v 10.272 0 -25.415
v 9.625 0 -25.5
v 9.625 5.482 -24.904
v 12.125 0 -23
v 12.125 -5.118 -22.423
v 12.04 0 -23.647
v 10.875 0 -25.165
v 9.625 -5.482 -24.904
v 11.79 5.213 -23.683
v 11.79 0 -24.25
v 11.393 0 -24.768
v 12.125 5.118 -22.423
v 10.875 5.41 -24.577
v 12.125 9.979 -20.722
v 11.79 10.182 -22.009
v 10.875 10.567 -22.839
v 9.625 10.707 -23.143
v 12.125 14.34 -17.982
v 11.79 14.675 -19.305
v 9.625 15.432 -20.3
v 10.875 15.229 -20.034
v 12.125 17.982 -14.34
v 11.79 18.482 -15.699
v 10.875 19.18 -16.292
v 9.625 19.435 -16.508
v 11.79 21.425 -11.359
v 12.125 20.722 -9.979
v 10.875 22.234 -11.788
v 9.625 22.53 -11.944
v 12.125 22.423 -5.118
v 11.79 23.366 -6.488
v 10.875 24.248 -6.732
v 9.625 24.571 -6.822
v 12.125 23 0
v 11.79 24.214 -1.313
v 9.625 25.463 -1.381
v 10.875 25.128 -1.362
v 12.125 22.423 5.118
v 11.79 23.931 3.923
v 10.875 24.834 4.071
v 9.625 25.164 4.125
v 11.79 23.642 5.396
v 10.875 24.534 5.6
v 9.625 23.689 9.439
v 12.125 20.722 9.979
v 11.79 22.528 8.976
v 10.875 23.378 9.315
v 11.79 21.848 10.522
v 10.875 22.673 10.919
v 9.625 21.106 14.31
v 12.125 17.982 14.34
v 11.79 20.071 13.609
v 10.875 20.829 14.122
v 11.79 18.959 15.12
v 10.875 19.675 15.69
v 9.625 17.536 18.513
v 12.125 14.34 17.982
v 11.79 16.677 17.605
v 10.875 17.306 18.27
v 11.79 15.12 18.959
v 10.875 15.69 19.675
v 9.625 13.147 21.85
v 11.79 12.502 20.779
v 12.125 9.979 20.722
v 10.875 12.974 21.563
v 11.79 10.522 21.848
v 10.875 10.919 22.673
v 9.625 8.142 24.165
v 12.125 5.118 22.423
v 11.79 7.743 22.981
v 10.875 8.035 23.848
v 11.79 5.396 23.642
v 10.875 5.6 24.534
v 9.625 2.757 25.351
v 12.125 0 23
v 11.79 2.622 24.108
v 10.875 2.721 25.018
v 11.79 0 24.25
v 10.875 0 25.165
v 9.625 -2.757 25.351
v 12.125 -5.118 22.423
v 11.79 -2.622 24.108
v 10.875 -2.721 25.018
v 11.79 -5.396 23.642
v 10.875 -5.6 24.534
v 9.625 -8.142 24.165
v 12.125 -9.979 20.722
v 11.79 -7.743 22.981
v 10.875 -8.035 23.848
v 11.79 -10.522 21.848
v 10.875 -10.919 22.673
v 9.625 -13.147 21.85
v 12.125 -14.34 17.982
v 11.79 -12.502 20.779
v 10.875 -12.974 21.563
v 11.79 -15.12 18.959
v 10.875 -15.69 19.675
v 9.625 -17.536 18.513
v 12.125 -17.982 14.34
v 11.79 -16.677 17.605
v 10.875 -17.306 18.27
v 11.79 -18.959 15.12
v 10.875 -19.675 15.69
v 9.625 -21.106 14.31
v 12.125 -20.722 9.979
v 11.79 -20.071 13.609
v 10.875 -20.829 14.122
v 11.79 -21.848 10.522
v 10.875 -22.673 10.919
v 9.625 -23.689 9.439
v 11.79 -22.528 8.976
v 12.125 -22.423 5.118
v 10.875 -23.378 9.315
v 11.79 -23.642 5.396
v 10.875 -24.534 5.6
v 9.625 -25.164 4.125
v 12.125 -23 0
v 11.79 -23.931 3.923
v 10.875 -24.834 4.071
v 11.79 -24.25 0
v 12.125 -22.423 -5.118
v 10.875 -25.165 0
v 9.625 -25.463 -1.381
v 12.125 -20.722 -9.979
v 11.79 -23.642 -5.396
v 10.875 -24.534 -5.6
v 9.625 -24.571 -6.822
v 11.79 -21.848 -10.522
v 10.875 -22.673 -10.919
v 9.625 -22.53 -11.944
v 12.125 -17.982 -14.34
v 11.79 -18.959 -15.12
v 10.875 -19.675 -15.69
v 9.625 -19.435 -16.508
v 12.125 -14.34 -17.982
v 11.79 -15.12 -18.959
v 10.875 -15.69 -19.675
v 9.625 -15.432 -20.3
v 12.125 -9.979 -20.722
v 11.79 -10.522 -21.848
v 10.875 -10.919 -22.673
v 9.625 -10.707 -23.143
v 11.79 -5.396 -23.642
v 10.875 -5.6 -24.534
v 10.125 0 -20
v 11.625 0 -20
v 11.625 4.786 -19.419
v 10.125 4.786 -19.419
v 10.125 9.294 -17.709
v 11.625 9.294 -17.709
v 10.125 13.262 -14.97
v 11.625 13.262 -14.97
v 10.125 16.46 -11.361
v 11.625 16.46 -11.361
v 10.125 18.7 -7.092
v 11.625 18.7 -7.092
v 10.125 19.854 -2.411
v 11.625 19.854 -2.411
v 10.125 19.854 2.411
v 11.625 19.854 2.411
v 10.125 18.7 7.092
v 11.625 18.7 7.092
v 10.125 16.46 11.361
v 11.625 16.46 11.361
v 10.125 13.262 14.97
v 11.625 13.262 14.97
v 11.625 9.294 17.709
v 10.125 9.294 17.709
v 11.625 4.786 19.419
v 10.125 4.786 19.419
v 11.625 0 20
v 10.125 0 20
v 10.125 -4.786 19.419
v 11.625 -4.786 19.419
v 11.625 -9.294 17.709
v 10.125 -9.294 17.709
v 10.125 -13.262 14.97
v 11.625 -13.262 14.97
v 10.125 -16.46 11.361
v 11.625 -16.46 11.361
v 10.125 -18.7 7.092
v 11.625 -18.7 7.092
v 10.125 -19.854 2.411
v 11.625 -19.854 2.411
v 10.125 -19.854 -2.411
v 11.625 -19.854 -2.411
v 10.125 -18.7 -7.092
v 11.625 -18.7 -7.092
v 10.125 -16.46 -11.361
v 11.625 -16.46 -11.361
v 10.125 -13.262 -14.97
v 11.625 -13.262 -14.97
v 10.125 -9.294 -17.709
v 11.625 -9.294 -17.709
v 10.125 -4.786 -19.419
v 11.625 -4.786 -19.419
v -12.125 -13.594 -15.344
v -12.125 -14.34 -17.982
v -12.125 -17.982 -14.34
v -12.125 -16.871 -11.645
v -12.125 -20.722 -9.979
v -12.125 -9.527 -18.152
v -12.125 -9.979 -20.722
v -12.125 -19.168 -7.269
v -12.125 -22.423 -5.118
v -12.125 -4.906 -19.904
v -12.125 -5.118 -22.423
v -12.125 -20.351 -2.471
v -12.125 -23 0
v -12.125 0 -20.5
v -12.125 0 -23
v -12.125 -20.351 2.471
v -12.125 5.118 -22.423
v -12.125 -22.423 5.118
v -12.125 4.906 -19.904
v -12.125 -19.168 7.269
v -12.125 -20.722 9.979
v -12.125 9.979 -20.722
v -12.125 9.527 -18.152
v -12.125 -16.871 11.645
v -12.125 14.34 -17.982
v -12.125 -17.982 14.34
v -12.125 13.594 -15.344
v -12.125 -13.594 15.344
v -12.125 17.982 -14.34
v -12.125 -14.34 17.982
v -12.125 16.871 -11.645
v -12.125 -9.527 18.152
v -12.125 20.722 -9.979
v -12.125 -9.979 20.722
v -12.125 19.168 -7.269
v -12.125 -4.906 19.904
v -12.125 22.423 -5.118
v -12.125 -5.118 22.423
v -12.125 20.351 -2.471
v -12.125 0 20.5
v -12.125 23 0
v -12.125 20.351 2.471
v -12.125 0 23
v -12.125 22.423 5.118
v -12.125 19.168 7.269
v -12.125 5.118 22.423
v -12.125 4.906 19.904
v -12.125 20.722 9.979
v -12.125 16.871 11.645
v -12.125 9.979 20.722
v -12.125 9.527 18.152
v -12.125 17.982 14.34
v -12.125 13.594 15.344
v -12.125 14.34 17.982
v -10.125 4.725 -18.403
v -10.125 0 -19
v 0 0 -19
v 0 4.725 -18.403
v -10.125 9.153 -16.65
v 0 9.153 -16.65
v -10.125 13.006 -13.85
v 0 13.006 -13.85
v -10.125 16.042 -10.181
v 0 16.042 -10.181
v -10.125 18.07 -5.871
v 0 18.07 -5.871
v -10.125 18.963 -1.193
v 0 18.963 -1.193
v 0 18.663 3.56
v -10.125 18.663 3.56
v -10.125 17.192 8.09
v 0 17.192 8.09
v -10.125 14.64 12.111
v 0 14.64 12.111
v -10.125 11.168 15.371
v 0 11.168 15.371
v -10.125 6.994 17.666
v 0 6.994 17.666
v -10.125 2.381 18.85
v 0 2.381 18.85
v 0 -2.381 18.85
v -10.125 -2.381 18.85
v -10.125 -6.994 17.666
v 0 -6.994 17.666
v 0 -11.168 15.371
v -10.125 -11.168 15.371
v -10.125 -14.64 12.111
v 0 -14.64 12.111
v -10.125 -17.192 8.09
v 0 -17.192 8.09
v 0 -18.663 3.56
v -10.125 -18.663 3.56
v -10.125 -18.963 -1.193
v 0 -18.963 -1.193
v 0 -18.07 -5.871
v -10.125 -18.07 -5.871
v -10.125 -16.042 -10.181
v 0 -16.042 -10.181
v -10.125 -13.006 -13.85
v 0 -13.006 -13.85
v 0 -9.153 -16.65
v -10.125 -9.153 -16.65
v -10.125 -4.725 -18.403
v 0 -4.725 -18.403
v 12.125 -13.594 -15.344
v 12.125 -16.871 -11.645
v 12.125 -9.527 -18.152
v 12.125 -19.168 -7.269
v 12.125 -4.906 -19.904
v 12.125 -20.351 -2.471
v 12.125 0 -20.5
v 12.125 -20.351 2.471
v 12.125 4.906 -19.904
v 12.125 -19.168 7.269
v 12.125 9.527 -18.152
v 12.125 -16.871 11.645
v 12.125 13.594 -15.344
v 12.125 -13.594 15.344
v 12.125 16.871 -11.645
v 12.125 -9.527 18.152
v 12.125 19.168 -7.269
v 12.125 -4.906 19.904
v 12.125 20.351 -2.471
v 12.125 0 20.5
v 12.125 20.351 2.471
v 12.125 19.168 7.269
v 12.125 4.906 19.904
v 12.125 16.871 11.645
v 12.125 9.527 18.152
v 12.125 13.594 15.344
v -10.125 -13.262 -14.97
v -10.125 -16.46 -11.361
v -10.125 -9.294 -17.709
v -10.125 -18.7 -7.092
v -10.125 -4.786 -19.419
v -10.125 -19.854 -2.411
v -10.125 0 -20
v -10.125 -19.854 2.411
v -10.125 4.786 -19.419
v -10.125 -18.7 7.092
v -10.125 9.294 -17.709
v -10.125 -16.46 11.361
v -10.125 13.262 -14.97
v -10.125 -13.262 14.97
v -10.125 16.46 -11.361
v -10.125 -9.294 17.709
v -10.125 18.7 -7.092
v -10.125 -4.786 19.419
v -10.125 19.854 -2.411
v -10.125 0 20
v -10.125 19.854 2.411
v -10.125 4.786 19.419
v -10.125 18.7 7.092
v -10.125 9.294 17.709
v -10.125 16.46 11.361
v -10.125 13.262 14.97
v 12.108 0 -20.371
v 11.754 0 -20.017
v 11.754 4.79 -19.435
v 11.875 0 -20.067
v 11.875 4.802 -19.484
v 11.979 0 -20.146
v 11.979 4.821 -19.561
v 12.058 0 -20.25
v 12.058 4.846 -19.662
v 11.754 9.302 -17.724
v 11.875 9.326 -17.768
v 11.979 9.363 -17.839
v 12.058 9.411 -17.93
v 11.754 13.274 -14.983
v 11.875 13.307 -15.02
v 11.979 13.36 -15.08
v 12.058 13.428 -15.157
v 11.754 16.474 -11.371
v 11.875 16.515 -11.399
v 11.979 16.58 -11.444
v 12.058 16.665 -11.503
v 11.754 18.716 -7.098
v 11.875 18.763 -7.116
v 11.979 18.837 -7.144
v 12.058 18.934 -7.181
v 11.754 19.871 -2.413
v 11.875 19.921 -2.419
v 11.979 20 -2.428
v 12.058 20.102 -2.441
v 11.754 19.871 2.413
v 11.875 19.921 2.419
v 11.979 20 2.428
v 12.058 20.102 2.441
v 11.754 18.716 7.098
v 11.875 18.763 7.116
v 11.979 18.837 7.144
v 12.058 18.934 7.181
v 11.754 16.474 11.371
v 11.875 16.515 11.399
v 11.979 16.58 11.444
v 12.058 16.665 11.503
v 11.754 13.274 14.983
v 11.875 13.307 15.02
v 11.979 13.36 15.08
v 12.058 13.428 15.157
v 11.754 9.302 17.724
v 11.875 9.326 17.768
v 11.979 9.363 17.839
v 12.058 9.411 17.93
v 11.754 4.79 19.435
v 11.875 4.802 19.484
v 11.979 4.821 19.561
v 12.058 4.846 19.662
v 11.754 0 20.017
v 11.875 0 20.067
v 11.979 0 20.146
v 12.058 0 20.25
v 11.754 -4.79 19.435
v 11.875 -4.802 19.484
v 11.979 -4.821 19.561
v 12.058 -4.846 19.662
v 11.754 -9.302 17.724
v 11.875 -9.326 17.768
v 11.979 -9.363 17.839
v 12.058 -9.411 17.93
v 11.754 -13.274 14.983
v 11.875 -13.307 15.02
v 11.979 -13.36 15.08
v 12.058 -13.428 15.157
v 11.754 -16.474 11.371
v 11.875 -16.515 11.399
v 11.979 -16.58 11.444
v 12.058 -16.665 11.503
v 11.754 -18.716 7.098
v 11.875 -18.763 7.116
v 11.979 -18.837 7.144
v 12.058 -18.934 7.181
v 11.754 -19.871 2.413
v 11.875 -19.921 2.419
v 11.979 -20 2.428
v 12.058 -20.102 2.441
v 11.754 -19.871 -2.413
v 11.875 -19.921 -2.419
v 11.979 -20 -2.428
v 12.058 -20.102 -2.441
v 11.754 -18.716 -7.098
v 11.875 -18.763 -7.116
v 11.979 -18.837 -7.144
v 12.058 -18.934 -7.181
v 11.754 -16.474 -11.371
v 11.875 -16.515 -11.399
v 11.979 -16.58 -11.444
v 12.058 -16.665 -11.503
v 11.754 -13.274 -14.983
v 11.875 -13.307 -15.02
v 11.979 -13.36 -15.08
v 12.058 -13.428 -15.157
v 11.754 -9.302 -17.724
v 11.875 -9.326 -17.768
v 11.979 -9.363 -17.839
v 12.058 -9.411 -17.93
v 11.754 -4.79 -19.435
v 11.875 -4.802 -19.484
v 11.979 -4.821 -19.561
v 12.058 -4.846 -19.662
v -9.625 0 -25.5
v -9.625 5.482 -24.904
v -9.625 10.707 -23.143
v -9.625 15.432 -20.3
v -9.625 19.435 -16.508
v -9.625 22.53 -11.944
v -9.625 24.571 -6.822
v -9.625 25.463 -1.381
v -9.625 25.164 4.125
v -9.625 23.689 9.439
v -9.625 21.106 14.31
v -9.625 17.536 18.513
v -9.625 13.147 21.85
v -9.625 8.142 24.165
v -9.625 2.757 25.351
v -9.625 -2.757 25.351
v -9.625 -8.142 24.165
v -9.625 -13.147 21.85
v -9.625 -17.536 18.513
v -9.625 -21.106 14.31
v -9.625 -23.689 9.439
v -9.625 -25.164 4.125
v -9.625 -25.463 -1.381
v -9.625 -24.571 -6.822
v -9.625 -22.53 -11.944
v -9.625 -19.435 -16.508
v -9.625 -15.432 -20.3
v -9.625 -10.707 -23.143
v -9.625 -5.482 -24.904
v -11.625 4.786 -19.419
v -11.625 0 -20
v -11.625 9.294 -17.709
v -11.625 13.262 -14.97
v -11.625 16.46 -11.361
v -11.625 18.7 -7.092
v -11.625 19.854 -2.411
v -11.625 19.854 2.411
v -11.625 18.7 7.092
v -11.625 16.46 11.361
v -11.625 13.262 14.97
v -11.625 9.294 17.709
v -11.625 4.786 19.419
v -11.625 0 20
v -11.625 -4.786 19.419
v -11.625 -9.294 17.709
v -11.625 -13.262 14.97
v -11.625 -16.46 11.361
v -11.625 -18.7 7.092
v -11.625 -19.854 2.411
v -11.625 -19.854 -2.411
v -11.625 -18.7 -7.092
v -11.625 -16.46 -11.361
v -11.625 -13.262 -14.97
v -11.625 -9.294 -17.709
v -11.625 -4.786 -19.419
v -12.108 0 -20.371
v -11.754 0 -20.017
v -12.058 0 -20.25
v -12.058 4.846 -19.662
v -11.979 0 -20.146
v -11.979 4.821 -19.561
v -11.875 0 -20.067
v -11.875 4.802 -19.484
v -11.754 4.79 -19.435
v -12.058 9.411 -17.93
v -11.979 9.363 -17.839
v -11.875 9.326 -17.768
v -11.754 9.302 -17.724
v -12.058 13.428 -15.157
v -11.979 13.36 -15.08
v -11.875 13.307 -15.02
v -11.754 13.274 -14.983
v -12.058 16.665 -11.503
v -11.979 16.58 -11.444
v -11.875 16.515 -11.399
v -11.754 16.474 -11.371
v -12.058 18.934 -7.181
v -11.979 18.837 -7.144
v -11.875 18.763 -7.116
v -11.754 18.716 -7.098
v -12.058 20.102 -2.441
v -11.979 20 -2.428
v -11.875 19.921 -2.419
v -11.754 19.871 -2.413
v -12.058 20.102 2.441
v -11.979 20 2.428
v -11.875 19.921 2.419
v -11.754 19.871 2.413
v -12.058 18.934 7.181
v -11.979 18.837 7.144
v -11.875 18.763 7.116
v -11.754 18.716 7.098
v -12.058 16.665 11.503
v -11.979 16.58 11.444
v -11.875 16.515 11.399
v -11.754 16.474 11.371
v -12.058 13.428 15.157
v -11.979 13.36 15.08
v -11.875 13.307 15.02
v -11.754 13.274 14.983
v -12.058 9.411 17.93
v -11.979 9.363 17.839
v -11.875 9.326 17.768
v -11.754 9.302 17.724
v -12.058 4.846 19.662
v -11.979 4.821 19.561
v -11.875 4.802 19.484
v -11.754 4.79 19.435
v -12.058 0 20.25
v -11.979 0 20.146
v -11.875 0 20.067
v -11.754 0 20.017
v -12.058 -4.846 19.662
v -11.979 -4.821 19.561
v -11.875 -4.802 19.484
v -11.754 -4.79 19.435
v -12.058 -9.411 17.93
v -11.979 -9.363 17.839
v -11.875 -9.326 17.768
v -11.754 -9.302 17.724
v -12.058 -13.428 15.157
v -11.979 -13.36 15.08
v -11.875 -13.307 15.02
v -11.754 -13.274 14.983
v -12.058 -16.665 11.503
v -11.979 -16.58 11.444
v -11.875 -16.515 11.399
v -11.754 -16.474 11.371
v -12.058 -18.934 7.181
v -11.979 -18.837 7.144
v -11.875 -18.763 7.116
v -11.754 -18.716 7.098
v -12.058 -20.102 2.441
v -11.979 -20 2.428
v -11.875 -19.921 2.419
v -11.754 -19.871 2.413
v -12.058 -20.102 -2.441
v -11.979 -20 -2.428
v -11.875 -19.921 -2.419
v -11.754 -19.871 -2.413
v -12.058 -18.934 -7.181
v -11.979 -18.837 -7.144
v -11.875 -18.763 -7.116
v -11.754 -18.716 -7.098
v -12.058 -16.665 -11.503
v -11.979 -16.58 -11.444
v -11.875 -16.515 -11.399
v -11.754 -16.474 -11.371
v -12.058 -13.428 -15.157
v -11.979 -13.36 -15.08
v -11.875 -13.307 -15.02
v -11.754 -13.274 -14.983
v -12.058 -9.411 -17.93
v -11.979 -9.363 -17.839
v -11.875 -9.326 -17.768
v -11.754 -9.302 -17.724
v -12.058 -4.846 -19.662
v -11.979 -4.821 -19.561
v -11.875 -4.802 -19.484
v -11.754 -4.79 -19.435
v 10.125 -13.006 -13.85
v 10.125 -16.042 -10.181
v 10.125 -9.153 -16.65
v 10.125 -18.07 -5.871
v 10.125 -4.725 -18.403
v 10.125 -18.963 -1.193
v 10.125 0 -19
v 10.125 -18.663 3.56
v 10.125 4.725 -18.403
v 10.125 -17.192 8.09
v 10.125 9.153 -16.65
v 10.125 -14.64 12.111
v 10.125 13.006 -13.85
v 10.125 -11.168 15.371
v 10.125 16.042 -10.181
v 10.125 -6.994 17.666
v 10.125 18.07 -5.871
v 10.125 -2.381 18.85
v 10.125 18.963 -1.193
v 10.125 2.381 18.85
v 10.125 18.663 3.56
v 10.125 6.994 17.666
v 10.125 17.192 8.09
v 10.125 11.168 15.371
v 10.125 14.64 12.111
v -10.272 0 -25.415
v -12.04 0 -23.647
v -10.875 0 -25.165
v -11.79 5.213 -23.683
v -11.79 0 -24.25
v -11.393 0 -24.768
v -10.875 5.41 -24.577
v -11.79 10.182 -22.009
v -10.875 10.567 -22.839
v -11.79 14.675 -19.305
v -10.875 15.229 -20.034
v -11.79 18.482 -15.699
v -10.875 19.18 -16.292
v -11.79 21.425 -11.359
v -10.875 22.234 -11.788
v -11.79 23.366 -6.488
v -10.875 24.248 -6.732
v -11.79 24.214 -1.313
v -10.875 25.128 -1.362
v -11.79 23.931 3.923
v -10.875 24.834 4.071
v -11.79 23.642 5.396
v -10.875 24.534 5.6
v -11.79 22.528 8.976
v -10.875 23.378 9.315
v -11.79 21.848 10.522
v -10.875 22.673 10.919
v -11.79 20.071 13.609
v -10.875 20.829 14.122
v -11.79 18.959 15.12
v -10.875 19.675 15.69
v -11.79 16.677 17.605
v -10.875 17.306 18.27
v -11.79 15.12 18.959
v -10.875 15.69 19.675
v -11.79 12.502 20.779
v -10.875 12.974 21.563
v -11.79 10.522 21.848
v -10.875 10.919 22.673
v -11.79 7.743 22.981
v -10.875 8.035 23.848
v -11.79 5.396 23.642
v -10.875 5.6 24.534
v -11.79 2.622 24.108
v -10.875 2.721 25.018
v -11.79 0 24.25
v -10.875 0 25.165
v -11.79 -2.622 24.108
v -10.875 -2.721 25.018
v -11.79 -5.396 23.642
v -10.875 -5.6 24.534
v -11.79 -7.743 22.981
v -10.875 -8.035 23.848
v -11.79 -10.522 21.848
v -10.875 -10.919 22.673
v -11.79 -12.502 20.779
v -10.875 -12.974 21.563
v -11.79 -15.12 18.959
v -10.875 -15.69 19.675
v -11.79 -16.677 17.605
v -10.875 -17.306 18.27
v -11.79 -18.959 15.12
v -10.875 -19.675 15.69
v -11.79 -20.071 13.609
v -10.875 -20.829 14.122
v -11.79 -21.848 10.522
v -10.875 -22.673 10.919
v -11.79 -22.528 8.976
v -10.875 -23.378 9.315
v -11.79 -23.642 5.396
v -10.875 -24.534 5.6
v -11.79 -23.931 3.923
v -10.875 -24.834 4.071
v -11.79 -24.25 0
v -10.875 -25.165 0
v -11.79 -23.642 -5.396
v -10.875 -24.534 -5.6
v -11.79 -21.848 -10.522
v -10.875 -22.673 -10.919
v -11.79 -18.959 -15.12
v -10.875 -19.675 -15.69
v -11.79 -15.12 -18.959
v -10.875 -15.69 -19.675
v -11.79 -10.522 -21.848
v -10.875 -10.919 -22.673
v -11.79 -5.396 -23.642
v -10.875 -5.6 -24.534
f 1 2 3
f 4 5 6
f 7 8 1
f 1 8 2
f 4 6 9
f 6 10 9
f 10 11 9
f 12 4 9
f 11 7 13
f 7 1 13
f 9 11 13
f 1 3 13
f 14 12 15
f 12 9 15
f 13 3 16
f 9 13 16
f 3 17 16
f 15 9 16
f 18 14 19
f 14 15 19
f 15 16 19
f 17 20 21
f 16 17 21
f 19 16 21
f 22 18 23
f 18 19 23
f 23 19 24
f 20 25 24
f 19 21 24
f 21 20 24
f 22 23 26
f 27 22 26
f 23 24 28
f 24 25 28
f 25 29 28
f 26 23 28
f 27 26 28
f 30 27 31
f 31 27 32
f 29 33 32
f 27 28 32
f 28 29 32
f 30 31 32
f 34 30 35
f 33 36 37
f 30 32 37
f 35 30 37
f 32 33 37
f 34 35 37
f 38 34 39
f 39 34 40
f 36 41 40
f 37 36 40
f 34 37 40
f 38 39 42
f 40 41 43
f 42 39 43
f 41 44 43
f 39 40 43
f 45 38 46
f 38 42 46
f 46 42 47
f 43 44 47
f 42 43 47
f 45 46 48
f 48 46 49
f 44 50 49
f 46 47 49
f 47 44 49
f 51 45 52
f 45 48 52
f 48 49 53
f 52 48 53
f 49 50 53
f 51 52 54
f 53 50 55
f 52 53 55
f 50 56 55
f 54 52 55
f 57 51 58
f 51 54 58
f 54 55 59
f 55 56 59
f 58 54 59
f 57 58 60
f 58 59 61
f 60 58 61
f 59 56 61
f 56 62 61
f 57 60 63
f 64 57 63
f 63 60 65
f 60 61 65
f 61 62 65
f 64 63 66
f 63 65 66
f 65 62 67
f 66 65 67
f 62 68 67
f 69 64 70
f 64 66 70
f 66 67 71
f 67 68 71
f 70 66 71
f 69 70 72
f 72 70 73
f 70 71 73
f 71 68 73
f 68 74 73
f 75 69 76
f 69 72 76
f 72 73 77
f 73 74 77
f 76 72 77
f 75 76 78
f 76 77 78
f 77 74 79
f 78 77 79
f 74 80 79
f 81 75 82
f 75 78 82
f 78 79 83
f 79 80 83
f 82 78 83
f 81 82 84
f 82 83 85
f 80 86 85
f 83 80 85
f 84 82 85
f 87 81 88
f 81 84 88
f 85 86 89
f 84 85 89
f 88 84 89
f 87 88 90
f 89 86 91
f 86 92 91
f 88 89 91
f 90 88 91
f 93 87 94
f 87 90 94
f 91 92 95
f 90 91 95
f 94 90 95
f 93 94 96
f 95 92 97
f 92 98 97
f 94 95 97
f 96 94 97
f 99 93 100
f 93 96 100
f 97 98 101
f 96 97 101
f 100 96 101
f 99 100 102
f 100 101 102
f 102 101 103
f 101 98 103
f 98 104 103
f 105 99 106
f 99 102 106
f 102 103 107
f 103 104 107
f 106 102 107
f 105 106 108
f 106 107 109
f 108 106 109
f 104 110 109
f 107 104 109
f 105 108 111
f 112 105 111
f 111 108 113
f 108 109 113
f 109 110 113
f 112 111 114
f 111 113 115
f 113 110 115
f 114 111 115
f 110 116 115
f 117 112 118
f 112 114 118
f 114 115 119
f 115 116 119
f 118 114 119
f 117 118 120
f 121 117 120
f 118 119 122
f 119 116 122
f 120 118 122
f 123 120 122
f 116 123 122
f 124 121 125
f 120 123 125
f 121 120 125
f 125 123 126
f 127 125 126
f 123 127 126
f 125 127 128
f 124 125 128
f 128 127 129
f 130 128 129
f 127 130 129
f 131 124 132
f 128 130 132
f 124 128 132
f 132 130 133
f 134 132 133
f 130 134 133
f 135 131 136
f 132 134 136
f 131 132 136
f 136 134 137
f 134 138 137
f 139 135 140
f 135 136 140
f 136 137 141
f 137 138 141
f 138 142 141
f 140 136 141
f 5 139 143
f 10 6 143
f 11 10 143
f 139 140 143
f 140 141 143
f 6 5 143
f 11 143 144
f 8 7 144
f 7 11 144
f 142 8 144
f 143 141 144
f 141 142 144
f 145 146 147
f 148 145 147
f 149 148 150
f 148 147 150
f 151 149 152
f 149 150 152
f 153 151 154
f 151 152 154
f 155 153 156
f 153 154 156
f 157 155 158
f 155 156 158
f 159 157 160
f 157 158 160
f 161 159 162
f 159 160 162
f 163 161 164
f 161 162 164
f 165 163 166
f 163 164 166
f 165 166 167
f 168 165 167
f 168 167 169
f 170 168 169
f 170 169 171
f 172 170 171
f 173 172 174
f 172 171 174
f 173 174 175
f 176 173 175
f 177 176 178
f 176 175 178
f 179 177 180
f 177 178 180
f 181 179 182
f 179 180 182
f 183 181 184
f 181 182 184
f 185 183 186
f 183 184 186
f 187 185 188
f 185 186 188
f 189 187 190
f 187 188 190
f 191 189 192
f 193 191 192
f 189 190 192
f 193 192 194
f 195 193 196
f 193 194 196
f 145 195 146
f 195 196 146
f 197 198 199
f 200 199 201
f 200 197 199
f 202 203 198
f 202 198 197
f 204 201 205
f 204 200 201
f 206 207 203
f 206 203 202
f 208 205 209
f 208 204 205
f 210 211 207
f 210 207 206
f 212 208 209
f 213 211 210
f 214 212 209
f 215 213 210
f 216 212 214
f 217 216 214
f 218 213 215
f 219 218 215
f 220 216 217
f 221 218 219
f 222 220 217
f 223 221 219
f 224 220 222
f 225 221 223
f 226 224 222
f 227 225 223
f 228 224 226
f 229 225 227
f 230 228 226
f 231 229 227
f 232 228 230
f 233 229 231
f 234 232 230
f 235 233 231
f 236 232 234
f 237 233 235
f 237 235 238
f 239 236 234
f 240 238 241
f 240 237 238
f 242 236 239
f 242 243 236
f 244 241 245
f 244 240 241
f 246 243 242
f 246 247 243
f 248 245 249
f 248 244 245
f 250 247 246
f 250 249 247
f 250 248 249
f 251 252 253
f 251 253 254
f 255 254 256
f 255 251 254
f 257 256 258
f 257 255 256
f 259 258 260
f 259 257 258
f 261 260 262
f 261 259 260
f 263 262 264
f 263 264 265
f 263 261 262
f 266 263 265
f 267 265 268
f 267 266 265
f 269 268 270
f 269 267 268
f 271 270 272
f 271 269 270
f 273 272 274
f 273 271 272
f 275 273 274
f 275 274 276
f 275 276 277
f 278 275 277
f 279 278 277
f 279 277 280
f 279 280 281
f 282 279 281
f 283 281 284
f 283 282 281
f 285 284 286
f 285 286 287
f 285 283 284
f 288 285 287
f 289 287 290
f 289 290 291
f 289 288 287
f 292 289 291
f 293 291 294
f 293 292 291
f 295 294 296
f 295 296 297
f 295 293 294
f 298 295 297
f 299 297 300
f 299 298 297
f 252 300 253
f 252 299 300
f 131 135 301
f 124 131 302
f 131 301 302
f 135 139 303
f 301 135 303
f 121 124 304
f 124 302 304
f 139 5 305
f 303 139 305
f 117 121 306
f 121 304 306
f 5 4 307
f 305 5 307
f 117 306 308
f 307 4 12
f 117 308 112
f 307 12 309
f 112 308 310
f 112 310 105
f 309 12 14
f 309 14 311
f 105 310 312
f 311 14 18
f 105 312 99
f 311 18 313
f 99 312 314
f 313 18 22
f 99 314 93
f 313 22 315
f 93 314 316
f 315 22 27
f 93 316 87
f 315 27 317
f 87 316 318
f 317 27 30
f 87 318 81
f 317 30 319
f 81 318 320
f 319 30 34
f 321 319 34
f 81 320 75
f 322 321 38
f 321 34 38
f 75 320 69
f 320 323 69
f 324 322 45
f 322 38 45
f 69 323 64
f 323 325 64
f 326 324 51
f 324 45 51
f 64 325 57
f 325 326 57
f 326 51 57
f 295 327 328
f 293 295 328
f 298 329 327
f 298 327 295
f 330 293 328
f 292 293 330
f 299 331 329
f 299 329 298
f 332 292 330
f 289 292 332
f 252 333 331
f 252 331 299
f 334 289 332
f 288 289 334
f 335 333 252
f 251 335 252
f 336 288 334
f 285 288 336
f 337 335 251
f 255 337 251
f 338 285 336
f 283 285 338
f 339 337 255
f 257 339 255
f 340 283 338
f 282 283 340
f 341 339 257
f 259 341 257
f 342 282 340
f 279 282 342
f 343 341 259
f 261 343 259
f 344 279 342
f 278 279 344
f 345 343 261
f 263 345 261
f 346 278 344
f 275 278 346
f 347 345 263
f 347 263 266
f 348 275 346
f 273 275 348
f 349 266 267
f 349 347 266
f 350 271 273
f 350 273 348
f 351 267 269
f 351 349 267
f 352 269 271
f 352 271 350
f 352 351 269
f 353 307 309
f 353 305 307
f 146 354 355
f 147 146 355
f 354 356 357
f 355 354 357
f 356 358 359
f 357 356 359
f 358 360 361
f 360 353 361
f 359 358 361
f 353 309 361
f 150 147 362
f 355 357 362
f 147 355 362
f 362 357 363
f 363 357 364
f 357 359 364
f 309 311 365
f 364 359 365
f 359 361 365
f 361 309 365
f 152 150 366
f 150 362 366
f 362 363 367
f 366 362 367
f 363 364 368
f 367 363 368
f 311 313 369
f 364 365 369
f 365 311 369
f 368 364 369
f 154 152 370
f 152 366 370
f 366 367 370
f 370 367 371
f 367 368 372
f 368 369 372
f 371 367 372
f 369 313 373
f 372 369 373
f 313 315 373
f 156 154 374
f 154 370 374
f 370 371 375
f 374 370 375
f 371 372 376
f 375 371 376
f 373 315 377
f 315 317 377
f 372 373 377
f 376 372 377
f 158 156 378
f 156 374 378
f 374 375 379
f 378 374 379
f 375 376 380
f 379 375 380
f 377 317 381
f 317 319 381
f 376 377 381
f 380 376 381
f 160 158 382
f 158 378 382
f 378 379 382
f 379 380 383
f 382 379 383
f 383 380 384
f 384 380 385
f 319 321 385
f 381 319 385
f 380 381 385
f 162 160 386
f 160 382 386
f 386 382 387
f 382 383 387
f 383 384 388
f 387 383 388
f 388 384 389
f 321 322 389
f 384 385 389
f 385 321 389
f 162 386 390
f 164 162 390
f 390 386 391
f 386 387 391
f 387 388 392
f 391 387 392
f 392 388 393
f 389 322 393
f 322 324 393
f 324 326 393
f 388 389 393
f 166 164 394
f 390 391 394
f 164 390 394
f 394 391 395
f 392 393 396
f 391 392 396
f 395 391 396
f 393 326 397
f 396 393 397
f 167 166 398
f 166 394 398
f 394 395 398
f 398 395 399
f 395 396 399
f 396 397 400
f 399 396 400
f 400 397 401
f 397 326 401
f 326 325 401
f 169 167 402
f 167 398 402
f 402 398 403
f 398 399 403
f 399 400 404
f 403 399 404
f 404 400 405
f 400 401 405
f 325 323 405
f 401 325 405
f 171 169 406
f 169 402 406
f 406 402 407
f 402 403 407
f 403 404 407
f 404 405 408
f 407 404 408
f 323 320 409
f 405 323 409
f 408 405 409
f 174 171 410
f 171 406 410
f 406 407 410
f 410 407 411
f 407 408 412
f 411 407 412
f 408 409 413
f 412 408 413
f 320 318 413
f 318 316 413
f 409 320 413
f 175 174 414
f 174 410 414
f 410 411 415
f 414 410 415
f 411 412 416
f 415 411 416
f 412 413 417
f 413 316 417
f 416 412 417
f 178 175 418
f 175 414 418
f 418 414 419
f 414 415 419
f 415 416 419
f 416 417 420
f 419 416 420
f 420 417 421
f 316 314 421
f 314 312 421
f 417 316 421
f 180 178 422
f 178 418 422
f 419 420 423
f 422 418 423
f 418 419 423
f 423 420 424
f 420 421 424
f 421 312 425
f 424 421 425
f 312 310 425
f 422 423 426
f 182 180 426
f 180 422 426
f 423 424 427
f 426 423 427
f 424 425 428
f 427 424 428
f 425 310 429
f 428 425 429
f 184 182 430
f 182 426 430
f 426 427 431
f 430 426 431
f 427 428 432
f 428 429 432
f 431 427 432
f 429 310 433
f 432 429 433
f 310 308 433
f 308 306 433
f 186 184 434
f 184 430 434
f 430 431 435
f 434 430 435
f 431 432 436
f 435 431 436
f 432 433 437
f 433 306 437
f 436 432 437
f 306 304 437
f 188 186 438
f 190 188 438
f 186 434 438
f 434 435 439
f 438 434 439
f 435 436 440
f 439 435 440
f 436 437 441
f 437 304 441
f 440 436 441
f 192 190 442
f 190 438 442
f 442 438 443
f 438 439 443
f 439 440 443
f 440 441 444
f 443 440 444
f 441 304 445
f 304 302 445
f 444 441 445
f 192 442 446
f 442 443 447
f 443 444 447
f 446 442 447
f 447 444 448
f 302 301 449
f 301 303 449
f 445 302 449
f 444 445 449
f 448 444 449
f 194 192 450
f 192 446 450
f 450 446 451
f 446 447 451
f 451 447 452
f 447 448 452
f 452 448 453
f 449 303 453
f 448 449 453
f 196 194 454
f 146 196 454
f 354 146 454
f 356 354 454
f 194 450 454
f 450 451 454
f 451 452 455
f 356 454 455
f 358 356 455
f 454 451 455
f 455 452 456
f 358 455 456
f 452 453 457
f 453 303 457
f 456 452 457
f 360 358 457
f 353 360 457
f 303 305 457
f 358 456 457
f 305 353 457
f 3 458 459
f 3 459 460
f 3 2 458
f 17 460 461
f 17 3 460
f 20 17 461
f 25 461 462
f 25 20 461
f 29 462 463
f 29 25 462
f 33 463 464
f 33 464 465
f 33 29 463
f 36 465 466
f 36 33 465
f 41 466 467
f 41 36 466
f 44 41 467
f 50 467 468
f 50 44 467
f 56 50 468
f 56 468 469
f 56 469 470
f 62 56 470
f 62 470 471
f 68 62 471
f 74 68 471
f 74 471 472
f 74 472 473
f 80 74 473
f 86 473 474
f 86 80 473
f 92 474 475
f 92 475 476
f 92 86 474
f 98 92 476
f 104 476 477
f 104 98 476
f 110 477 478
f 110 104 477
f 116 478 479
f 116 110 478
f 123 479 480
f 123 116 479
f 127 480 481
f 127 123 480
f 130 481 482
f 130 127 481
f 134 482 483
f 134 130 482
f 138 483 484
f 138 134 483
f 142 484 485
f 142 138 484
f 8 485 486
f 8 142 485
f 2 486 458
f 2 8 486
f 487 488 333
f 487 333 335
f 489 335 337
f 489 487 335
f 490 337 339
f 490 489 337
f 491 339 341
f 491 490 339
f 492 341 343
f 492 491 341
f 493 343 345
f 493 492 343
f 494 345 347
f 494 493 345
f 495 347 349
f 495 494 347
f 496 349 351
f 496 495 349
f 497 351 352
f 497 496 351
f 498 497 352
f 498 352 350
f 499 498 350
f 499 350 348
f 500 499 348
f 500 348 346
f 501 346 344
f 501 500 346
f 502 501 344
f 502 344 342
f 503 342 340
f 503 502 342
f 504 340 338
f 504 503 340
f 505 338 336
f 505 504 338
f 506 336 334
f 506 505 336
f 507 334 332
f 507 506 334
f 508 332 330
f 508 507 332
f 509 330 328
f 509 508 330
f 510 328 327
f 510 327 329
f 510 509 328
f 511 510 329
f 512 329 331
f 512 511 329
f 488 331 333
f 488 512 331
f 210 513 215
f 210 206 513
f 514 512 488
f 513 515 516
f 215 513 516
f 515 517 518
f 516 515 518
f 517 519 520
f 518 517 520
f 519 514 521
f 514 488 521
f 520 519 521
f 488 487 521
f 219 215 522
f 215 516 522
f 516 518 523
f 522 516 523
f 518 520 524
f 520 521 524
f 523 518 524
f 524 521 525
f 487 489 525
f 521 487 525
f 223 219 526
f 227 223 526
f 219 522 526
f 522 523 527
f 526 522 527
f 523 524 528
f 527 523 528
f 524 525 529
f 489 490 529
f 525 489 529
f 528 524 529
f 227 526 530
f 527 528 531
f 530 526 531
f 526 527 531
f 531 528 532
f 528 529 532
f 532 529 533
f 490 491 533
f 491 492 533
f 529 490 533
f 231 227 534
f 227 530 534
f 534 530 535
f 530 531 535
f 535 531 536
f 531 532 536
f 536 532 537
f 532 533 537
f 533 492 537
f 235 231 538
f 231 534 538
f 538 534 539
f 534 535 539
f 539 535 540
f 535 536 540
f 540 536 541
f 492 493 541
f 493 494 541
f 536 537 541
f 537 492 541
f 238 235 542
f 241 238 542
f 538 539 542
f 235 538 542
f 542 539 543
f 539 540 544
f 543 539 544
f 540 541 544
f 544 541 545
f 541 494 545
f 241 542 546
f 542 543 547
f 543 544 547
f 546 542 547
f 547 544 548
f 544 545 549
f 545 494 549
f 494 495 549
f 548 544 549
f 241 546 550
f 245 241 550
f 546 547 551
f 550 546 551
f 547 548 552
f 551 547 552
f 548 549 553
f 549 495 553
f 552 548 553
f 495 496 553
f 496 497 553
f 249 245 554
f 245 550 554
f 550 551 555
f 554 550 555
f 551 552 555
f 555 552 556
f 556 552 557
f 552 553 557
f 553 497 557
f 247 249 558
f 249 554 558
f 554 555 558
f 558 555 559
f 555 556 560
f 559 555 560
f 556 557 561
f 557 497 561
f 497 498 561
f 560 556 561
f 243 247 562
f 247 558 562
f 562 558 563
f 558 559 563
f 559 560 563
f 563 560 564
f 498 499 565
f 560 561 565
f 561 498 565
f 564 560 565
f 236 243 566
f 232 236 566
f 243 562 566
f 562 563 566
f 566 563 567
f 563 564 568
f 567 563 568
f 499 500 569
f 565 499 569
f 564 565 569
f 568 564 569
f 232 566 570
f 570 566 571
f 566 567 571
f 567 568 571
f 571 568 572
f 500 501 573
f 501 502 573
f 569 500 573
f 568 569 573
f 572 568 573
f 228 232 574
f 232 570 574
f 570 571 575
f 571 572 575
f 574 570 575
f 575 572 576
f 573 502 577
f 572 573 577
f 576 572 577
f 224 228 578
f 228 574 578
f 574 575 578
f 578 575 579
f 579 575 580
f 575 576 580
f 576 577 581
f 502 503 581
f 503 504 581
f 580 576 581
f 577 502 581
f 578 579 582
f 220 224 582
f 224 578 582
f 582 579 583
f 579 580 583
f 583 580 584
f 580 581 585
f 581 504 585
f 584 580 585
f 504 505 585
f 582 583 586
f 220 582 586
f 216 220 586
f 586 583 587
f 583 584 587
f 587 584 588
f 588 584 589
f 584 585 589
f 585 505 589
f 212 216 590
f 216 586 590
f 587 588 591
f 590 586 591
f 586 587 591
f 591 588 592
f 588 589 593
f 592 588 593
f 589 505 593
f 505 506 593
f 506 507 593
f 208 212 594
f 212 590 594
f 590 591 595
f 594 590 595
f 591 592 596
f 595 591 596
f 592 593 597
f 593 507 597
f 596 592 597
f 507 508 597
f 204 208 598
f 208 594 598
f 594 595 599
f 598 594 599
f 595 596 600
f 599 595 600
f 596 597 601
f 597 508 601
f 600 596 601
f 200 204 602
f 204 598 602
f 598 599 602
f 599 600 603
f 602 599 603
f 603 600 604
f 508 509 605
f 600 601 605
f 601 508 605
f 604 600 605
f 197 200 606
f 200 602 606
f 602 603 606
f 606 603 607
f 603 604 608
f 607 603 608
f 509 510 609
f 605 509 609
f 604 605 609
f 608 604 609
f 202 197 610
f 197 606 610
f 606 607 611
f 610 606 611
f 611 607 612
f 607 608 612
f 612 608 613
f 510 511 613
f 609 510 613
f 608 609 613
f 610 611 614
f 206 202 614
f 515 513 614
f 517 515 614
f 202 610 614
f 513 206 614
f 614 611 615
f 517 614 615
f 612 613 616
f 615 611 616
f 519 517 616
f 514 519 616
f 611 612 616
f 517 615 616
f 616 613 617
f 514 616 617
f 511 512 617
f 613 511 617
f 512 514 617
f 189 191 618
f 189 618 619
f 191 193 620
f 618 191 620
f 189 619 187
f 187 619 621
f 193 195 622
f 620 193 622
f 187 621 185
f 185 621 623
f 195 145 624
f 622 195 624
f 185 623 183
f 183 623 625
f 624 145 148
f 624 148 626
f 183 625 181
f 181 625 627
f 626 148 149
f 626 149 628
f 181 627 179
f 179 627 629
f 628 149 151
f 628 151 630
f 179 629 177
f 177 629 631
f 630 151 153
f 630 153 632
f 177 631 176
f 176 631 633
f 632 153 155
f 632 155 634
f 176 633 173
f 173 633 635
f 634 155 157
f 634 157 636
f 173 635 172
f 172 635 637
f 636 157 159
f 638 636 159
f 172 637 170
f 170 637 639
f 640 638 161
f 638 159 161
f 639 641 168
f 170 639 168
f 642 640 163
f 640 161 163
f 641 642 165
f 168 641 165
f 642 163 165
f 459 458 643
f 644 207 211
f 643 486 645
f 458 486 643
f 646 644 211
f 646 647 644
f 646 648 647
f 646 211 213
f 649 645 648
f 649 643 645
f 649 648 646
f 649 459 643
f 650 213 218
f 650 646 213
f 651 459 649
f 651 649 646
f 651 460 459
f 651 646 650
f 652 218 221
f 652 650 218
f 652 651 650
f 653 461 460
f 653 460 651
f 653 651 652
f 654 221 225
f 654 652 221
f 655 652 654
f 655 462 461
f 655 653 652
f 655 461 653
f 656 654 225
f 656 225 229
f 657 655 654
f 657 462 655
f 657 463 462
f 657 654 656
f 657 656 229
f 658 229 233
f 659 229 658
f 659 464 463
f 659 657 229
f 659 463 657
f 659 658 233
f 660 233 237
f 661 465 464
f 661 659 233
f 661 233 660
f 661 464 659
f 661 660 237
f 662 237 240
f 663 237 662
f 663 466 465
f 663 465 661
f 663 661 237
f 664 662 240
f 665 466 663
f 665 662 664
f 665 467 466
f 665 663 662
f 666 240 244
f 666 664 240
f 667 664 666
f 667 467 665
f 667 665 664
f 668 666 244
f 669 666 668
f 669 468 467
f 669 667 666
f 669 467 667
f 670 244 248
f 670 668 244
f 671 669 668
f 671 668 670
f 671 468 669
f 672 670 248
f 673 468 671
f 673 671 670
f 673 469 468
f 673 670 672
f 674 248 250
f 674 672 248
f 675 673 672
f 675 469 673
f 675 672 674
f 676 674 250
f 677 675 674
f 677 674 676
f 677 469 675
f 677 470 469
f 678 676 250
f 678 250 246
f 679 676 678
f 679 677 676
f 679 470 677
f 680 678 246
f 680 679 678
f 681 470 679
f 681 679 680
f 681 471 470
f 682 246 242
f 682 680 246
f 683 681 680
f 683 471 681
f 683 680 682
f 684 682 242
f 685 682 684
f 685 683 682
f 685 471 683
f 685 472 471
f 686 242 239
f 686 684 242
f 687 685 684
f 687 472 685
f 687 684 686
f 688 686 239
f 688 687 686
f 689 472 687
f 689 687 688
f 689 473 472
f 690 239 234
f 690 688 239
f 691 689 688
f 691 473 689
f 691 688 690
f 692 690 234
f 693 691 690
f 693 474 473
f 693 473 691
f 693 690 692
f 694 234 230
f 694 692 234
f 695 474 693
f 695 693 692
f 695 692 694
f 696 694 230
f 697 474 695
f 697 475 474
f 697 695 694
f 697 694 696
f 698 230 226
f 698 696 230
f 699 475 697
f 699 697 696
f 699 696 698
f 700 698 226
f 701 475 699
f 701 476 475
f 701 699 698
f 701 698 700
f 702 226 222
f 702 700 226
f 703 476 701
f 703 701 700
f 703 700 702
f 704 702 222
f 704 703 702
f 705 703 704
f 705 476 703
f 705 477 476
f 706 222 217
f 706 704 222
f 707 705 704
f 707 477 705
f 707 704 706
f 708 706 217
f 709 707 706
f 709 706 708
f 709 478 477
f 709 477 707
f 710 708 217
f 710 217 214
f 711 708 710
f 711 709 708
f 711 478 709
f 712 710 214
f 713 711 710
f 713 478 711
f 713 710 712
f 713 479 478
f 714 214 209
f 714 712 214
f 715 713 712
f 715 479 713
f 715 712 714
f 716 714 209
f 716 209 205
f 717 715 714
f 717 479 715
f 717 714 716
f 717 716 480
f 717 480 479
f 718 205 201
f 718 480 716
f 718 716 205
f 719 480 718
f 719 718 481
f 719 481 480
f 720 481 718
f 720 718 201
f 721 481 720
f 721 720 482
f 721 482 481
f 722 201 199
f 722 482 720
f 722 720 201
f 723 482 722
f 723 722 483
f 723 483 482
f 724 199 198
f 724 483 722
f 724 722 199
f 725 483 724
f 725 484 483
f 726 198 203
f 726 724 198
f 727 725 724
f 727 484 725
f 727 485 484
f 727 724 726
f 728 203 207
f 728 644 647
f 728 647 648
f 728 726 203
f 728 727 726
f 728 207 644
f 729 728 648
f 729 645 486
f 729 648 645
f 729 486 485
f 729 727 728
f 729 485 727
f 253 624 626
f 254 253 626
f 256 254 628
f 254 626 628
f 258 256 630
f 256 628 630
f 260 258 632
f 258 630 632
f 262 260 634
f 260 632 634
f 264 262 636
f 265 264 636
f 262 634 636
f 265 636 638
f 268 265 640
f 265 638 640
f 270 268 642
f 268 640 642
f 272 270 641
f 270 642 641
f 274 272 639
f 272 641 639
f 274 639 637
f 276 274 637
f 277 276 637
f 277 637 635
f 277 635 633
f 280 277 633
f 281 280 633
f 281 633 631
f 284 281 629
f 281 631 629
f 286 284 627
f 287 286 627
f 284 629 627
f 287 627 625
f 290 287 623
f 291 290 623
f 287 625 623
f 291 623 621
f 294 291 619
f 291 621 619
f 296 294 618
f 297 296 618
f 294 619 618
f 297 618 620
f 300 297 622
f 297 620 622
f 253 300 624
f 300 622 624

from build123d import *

# Parameters (mm, degrees)
FILLET1_R = 2.5
FILLET2_R = 0.5


with BuildPart() as part:
    # Sketch1 → Revolve1 (revolve)
    with BuildSketch(Plane(origin=(0, 0, 0), x_dir=(1, 0, 0), z_dir=(0, 1, 0))):
        Polygon((0, 19), (10.125, 19), (10.125, 20), (12.125, 20), (12.125, 25.5), (0, 25.5), align=None)
    revolve1 = revolve(axis=Axis((0, 0, 0), (1, 0, 0)))

    # Mirror1: Revolve1 across plane
    add(revolve1.mirror(Plane(origin=(0, 0, 0), x_dir=(0, 0, 1), z_dir=(1, 0, 0))))

    # Fillet1
    fillet1_edges = [part.edges().sort_by_distance(p)[0] for p in [
        (-12.125, 0, 25.5),
        (12.125, 0, 25.5),
    ]]
    fillet(fillet1_edges, radius=FILLET1_R)

    # Fillet2
    fillet2_edges = [part.edges().sort_by_distance(p)[0] for p in [
        (-12.125, 0, 20),
        (12.125, 0, 20),
    ]]
    fillet(fillet2_edges, radius=FILLET2_R)


solid = part.part
